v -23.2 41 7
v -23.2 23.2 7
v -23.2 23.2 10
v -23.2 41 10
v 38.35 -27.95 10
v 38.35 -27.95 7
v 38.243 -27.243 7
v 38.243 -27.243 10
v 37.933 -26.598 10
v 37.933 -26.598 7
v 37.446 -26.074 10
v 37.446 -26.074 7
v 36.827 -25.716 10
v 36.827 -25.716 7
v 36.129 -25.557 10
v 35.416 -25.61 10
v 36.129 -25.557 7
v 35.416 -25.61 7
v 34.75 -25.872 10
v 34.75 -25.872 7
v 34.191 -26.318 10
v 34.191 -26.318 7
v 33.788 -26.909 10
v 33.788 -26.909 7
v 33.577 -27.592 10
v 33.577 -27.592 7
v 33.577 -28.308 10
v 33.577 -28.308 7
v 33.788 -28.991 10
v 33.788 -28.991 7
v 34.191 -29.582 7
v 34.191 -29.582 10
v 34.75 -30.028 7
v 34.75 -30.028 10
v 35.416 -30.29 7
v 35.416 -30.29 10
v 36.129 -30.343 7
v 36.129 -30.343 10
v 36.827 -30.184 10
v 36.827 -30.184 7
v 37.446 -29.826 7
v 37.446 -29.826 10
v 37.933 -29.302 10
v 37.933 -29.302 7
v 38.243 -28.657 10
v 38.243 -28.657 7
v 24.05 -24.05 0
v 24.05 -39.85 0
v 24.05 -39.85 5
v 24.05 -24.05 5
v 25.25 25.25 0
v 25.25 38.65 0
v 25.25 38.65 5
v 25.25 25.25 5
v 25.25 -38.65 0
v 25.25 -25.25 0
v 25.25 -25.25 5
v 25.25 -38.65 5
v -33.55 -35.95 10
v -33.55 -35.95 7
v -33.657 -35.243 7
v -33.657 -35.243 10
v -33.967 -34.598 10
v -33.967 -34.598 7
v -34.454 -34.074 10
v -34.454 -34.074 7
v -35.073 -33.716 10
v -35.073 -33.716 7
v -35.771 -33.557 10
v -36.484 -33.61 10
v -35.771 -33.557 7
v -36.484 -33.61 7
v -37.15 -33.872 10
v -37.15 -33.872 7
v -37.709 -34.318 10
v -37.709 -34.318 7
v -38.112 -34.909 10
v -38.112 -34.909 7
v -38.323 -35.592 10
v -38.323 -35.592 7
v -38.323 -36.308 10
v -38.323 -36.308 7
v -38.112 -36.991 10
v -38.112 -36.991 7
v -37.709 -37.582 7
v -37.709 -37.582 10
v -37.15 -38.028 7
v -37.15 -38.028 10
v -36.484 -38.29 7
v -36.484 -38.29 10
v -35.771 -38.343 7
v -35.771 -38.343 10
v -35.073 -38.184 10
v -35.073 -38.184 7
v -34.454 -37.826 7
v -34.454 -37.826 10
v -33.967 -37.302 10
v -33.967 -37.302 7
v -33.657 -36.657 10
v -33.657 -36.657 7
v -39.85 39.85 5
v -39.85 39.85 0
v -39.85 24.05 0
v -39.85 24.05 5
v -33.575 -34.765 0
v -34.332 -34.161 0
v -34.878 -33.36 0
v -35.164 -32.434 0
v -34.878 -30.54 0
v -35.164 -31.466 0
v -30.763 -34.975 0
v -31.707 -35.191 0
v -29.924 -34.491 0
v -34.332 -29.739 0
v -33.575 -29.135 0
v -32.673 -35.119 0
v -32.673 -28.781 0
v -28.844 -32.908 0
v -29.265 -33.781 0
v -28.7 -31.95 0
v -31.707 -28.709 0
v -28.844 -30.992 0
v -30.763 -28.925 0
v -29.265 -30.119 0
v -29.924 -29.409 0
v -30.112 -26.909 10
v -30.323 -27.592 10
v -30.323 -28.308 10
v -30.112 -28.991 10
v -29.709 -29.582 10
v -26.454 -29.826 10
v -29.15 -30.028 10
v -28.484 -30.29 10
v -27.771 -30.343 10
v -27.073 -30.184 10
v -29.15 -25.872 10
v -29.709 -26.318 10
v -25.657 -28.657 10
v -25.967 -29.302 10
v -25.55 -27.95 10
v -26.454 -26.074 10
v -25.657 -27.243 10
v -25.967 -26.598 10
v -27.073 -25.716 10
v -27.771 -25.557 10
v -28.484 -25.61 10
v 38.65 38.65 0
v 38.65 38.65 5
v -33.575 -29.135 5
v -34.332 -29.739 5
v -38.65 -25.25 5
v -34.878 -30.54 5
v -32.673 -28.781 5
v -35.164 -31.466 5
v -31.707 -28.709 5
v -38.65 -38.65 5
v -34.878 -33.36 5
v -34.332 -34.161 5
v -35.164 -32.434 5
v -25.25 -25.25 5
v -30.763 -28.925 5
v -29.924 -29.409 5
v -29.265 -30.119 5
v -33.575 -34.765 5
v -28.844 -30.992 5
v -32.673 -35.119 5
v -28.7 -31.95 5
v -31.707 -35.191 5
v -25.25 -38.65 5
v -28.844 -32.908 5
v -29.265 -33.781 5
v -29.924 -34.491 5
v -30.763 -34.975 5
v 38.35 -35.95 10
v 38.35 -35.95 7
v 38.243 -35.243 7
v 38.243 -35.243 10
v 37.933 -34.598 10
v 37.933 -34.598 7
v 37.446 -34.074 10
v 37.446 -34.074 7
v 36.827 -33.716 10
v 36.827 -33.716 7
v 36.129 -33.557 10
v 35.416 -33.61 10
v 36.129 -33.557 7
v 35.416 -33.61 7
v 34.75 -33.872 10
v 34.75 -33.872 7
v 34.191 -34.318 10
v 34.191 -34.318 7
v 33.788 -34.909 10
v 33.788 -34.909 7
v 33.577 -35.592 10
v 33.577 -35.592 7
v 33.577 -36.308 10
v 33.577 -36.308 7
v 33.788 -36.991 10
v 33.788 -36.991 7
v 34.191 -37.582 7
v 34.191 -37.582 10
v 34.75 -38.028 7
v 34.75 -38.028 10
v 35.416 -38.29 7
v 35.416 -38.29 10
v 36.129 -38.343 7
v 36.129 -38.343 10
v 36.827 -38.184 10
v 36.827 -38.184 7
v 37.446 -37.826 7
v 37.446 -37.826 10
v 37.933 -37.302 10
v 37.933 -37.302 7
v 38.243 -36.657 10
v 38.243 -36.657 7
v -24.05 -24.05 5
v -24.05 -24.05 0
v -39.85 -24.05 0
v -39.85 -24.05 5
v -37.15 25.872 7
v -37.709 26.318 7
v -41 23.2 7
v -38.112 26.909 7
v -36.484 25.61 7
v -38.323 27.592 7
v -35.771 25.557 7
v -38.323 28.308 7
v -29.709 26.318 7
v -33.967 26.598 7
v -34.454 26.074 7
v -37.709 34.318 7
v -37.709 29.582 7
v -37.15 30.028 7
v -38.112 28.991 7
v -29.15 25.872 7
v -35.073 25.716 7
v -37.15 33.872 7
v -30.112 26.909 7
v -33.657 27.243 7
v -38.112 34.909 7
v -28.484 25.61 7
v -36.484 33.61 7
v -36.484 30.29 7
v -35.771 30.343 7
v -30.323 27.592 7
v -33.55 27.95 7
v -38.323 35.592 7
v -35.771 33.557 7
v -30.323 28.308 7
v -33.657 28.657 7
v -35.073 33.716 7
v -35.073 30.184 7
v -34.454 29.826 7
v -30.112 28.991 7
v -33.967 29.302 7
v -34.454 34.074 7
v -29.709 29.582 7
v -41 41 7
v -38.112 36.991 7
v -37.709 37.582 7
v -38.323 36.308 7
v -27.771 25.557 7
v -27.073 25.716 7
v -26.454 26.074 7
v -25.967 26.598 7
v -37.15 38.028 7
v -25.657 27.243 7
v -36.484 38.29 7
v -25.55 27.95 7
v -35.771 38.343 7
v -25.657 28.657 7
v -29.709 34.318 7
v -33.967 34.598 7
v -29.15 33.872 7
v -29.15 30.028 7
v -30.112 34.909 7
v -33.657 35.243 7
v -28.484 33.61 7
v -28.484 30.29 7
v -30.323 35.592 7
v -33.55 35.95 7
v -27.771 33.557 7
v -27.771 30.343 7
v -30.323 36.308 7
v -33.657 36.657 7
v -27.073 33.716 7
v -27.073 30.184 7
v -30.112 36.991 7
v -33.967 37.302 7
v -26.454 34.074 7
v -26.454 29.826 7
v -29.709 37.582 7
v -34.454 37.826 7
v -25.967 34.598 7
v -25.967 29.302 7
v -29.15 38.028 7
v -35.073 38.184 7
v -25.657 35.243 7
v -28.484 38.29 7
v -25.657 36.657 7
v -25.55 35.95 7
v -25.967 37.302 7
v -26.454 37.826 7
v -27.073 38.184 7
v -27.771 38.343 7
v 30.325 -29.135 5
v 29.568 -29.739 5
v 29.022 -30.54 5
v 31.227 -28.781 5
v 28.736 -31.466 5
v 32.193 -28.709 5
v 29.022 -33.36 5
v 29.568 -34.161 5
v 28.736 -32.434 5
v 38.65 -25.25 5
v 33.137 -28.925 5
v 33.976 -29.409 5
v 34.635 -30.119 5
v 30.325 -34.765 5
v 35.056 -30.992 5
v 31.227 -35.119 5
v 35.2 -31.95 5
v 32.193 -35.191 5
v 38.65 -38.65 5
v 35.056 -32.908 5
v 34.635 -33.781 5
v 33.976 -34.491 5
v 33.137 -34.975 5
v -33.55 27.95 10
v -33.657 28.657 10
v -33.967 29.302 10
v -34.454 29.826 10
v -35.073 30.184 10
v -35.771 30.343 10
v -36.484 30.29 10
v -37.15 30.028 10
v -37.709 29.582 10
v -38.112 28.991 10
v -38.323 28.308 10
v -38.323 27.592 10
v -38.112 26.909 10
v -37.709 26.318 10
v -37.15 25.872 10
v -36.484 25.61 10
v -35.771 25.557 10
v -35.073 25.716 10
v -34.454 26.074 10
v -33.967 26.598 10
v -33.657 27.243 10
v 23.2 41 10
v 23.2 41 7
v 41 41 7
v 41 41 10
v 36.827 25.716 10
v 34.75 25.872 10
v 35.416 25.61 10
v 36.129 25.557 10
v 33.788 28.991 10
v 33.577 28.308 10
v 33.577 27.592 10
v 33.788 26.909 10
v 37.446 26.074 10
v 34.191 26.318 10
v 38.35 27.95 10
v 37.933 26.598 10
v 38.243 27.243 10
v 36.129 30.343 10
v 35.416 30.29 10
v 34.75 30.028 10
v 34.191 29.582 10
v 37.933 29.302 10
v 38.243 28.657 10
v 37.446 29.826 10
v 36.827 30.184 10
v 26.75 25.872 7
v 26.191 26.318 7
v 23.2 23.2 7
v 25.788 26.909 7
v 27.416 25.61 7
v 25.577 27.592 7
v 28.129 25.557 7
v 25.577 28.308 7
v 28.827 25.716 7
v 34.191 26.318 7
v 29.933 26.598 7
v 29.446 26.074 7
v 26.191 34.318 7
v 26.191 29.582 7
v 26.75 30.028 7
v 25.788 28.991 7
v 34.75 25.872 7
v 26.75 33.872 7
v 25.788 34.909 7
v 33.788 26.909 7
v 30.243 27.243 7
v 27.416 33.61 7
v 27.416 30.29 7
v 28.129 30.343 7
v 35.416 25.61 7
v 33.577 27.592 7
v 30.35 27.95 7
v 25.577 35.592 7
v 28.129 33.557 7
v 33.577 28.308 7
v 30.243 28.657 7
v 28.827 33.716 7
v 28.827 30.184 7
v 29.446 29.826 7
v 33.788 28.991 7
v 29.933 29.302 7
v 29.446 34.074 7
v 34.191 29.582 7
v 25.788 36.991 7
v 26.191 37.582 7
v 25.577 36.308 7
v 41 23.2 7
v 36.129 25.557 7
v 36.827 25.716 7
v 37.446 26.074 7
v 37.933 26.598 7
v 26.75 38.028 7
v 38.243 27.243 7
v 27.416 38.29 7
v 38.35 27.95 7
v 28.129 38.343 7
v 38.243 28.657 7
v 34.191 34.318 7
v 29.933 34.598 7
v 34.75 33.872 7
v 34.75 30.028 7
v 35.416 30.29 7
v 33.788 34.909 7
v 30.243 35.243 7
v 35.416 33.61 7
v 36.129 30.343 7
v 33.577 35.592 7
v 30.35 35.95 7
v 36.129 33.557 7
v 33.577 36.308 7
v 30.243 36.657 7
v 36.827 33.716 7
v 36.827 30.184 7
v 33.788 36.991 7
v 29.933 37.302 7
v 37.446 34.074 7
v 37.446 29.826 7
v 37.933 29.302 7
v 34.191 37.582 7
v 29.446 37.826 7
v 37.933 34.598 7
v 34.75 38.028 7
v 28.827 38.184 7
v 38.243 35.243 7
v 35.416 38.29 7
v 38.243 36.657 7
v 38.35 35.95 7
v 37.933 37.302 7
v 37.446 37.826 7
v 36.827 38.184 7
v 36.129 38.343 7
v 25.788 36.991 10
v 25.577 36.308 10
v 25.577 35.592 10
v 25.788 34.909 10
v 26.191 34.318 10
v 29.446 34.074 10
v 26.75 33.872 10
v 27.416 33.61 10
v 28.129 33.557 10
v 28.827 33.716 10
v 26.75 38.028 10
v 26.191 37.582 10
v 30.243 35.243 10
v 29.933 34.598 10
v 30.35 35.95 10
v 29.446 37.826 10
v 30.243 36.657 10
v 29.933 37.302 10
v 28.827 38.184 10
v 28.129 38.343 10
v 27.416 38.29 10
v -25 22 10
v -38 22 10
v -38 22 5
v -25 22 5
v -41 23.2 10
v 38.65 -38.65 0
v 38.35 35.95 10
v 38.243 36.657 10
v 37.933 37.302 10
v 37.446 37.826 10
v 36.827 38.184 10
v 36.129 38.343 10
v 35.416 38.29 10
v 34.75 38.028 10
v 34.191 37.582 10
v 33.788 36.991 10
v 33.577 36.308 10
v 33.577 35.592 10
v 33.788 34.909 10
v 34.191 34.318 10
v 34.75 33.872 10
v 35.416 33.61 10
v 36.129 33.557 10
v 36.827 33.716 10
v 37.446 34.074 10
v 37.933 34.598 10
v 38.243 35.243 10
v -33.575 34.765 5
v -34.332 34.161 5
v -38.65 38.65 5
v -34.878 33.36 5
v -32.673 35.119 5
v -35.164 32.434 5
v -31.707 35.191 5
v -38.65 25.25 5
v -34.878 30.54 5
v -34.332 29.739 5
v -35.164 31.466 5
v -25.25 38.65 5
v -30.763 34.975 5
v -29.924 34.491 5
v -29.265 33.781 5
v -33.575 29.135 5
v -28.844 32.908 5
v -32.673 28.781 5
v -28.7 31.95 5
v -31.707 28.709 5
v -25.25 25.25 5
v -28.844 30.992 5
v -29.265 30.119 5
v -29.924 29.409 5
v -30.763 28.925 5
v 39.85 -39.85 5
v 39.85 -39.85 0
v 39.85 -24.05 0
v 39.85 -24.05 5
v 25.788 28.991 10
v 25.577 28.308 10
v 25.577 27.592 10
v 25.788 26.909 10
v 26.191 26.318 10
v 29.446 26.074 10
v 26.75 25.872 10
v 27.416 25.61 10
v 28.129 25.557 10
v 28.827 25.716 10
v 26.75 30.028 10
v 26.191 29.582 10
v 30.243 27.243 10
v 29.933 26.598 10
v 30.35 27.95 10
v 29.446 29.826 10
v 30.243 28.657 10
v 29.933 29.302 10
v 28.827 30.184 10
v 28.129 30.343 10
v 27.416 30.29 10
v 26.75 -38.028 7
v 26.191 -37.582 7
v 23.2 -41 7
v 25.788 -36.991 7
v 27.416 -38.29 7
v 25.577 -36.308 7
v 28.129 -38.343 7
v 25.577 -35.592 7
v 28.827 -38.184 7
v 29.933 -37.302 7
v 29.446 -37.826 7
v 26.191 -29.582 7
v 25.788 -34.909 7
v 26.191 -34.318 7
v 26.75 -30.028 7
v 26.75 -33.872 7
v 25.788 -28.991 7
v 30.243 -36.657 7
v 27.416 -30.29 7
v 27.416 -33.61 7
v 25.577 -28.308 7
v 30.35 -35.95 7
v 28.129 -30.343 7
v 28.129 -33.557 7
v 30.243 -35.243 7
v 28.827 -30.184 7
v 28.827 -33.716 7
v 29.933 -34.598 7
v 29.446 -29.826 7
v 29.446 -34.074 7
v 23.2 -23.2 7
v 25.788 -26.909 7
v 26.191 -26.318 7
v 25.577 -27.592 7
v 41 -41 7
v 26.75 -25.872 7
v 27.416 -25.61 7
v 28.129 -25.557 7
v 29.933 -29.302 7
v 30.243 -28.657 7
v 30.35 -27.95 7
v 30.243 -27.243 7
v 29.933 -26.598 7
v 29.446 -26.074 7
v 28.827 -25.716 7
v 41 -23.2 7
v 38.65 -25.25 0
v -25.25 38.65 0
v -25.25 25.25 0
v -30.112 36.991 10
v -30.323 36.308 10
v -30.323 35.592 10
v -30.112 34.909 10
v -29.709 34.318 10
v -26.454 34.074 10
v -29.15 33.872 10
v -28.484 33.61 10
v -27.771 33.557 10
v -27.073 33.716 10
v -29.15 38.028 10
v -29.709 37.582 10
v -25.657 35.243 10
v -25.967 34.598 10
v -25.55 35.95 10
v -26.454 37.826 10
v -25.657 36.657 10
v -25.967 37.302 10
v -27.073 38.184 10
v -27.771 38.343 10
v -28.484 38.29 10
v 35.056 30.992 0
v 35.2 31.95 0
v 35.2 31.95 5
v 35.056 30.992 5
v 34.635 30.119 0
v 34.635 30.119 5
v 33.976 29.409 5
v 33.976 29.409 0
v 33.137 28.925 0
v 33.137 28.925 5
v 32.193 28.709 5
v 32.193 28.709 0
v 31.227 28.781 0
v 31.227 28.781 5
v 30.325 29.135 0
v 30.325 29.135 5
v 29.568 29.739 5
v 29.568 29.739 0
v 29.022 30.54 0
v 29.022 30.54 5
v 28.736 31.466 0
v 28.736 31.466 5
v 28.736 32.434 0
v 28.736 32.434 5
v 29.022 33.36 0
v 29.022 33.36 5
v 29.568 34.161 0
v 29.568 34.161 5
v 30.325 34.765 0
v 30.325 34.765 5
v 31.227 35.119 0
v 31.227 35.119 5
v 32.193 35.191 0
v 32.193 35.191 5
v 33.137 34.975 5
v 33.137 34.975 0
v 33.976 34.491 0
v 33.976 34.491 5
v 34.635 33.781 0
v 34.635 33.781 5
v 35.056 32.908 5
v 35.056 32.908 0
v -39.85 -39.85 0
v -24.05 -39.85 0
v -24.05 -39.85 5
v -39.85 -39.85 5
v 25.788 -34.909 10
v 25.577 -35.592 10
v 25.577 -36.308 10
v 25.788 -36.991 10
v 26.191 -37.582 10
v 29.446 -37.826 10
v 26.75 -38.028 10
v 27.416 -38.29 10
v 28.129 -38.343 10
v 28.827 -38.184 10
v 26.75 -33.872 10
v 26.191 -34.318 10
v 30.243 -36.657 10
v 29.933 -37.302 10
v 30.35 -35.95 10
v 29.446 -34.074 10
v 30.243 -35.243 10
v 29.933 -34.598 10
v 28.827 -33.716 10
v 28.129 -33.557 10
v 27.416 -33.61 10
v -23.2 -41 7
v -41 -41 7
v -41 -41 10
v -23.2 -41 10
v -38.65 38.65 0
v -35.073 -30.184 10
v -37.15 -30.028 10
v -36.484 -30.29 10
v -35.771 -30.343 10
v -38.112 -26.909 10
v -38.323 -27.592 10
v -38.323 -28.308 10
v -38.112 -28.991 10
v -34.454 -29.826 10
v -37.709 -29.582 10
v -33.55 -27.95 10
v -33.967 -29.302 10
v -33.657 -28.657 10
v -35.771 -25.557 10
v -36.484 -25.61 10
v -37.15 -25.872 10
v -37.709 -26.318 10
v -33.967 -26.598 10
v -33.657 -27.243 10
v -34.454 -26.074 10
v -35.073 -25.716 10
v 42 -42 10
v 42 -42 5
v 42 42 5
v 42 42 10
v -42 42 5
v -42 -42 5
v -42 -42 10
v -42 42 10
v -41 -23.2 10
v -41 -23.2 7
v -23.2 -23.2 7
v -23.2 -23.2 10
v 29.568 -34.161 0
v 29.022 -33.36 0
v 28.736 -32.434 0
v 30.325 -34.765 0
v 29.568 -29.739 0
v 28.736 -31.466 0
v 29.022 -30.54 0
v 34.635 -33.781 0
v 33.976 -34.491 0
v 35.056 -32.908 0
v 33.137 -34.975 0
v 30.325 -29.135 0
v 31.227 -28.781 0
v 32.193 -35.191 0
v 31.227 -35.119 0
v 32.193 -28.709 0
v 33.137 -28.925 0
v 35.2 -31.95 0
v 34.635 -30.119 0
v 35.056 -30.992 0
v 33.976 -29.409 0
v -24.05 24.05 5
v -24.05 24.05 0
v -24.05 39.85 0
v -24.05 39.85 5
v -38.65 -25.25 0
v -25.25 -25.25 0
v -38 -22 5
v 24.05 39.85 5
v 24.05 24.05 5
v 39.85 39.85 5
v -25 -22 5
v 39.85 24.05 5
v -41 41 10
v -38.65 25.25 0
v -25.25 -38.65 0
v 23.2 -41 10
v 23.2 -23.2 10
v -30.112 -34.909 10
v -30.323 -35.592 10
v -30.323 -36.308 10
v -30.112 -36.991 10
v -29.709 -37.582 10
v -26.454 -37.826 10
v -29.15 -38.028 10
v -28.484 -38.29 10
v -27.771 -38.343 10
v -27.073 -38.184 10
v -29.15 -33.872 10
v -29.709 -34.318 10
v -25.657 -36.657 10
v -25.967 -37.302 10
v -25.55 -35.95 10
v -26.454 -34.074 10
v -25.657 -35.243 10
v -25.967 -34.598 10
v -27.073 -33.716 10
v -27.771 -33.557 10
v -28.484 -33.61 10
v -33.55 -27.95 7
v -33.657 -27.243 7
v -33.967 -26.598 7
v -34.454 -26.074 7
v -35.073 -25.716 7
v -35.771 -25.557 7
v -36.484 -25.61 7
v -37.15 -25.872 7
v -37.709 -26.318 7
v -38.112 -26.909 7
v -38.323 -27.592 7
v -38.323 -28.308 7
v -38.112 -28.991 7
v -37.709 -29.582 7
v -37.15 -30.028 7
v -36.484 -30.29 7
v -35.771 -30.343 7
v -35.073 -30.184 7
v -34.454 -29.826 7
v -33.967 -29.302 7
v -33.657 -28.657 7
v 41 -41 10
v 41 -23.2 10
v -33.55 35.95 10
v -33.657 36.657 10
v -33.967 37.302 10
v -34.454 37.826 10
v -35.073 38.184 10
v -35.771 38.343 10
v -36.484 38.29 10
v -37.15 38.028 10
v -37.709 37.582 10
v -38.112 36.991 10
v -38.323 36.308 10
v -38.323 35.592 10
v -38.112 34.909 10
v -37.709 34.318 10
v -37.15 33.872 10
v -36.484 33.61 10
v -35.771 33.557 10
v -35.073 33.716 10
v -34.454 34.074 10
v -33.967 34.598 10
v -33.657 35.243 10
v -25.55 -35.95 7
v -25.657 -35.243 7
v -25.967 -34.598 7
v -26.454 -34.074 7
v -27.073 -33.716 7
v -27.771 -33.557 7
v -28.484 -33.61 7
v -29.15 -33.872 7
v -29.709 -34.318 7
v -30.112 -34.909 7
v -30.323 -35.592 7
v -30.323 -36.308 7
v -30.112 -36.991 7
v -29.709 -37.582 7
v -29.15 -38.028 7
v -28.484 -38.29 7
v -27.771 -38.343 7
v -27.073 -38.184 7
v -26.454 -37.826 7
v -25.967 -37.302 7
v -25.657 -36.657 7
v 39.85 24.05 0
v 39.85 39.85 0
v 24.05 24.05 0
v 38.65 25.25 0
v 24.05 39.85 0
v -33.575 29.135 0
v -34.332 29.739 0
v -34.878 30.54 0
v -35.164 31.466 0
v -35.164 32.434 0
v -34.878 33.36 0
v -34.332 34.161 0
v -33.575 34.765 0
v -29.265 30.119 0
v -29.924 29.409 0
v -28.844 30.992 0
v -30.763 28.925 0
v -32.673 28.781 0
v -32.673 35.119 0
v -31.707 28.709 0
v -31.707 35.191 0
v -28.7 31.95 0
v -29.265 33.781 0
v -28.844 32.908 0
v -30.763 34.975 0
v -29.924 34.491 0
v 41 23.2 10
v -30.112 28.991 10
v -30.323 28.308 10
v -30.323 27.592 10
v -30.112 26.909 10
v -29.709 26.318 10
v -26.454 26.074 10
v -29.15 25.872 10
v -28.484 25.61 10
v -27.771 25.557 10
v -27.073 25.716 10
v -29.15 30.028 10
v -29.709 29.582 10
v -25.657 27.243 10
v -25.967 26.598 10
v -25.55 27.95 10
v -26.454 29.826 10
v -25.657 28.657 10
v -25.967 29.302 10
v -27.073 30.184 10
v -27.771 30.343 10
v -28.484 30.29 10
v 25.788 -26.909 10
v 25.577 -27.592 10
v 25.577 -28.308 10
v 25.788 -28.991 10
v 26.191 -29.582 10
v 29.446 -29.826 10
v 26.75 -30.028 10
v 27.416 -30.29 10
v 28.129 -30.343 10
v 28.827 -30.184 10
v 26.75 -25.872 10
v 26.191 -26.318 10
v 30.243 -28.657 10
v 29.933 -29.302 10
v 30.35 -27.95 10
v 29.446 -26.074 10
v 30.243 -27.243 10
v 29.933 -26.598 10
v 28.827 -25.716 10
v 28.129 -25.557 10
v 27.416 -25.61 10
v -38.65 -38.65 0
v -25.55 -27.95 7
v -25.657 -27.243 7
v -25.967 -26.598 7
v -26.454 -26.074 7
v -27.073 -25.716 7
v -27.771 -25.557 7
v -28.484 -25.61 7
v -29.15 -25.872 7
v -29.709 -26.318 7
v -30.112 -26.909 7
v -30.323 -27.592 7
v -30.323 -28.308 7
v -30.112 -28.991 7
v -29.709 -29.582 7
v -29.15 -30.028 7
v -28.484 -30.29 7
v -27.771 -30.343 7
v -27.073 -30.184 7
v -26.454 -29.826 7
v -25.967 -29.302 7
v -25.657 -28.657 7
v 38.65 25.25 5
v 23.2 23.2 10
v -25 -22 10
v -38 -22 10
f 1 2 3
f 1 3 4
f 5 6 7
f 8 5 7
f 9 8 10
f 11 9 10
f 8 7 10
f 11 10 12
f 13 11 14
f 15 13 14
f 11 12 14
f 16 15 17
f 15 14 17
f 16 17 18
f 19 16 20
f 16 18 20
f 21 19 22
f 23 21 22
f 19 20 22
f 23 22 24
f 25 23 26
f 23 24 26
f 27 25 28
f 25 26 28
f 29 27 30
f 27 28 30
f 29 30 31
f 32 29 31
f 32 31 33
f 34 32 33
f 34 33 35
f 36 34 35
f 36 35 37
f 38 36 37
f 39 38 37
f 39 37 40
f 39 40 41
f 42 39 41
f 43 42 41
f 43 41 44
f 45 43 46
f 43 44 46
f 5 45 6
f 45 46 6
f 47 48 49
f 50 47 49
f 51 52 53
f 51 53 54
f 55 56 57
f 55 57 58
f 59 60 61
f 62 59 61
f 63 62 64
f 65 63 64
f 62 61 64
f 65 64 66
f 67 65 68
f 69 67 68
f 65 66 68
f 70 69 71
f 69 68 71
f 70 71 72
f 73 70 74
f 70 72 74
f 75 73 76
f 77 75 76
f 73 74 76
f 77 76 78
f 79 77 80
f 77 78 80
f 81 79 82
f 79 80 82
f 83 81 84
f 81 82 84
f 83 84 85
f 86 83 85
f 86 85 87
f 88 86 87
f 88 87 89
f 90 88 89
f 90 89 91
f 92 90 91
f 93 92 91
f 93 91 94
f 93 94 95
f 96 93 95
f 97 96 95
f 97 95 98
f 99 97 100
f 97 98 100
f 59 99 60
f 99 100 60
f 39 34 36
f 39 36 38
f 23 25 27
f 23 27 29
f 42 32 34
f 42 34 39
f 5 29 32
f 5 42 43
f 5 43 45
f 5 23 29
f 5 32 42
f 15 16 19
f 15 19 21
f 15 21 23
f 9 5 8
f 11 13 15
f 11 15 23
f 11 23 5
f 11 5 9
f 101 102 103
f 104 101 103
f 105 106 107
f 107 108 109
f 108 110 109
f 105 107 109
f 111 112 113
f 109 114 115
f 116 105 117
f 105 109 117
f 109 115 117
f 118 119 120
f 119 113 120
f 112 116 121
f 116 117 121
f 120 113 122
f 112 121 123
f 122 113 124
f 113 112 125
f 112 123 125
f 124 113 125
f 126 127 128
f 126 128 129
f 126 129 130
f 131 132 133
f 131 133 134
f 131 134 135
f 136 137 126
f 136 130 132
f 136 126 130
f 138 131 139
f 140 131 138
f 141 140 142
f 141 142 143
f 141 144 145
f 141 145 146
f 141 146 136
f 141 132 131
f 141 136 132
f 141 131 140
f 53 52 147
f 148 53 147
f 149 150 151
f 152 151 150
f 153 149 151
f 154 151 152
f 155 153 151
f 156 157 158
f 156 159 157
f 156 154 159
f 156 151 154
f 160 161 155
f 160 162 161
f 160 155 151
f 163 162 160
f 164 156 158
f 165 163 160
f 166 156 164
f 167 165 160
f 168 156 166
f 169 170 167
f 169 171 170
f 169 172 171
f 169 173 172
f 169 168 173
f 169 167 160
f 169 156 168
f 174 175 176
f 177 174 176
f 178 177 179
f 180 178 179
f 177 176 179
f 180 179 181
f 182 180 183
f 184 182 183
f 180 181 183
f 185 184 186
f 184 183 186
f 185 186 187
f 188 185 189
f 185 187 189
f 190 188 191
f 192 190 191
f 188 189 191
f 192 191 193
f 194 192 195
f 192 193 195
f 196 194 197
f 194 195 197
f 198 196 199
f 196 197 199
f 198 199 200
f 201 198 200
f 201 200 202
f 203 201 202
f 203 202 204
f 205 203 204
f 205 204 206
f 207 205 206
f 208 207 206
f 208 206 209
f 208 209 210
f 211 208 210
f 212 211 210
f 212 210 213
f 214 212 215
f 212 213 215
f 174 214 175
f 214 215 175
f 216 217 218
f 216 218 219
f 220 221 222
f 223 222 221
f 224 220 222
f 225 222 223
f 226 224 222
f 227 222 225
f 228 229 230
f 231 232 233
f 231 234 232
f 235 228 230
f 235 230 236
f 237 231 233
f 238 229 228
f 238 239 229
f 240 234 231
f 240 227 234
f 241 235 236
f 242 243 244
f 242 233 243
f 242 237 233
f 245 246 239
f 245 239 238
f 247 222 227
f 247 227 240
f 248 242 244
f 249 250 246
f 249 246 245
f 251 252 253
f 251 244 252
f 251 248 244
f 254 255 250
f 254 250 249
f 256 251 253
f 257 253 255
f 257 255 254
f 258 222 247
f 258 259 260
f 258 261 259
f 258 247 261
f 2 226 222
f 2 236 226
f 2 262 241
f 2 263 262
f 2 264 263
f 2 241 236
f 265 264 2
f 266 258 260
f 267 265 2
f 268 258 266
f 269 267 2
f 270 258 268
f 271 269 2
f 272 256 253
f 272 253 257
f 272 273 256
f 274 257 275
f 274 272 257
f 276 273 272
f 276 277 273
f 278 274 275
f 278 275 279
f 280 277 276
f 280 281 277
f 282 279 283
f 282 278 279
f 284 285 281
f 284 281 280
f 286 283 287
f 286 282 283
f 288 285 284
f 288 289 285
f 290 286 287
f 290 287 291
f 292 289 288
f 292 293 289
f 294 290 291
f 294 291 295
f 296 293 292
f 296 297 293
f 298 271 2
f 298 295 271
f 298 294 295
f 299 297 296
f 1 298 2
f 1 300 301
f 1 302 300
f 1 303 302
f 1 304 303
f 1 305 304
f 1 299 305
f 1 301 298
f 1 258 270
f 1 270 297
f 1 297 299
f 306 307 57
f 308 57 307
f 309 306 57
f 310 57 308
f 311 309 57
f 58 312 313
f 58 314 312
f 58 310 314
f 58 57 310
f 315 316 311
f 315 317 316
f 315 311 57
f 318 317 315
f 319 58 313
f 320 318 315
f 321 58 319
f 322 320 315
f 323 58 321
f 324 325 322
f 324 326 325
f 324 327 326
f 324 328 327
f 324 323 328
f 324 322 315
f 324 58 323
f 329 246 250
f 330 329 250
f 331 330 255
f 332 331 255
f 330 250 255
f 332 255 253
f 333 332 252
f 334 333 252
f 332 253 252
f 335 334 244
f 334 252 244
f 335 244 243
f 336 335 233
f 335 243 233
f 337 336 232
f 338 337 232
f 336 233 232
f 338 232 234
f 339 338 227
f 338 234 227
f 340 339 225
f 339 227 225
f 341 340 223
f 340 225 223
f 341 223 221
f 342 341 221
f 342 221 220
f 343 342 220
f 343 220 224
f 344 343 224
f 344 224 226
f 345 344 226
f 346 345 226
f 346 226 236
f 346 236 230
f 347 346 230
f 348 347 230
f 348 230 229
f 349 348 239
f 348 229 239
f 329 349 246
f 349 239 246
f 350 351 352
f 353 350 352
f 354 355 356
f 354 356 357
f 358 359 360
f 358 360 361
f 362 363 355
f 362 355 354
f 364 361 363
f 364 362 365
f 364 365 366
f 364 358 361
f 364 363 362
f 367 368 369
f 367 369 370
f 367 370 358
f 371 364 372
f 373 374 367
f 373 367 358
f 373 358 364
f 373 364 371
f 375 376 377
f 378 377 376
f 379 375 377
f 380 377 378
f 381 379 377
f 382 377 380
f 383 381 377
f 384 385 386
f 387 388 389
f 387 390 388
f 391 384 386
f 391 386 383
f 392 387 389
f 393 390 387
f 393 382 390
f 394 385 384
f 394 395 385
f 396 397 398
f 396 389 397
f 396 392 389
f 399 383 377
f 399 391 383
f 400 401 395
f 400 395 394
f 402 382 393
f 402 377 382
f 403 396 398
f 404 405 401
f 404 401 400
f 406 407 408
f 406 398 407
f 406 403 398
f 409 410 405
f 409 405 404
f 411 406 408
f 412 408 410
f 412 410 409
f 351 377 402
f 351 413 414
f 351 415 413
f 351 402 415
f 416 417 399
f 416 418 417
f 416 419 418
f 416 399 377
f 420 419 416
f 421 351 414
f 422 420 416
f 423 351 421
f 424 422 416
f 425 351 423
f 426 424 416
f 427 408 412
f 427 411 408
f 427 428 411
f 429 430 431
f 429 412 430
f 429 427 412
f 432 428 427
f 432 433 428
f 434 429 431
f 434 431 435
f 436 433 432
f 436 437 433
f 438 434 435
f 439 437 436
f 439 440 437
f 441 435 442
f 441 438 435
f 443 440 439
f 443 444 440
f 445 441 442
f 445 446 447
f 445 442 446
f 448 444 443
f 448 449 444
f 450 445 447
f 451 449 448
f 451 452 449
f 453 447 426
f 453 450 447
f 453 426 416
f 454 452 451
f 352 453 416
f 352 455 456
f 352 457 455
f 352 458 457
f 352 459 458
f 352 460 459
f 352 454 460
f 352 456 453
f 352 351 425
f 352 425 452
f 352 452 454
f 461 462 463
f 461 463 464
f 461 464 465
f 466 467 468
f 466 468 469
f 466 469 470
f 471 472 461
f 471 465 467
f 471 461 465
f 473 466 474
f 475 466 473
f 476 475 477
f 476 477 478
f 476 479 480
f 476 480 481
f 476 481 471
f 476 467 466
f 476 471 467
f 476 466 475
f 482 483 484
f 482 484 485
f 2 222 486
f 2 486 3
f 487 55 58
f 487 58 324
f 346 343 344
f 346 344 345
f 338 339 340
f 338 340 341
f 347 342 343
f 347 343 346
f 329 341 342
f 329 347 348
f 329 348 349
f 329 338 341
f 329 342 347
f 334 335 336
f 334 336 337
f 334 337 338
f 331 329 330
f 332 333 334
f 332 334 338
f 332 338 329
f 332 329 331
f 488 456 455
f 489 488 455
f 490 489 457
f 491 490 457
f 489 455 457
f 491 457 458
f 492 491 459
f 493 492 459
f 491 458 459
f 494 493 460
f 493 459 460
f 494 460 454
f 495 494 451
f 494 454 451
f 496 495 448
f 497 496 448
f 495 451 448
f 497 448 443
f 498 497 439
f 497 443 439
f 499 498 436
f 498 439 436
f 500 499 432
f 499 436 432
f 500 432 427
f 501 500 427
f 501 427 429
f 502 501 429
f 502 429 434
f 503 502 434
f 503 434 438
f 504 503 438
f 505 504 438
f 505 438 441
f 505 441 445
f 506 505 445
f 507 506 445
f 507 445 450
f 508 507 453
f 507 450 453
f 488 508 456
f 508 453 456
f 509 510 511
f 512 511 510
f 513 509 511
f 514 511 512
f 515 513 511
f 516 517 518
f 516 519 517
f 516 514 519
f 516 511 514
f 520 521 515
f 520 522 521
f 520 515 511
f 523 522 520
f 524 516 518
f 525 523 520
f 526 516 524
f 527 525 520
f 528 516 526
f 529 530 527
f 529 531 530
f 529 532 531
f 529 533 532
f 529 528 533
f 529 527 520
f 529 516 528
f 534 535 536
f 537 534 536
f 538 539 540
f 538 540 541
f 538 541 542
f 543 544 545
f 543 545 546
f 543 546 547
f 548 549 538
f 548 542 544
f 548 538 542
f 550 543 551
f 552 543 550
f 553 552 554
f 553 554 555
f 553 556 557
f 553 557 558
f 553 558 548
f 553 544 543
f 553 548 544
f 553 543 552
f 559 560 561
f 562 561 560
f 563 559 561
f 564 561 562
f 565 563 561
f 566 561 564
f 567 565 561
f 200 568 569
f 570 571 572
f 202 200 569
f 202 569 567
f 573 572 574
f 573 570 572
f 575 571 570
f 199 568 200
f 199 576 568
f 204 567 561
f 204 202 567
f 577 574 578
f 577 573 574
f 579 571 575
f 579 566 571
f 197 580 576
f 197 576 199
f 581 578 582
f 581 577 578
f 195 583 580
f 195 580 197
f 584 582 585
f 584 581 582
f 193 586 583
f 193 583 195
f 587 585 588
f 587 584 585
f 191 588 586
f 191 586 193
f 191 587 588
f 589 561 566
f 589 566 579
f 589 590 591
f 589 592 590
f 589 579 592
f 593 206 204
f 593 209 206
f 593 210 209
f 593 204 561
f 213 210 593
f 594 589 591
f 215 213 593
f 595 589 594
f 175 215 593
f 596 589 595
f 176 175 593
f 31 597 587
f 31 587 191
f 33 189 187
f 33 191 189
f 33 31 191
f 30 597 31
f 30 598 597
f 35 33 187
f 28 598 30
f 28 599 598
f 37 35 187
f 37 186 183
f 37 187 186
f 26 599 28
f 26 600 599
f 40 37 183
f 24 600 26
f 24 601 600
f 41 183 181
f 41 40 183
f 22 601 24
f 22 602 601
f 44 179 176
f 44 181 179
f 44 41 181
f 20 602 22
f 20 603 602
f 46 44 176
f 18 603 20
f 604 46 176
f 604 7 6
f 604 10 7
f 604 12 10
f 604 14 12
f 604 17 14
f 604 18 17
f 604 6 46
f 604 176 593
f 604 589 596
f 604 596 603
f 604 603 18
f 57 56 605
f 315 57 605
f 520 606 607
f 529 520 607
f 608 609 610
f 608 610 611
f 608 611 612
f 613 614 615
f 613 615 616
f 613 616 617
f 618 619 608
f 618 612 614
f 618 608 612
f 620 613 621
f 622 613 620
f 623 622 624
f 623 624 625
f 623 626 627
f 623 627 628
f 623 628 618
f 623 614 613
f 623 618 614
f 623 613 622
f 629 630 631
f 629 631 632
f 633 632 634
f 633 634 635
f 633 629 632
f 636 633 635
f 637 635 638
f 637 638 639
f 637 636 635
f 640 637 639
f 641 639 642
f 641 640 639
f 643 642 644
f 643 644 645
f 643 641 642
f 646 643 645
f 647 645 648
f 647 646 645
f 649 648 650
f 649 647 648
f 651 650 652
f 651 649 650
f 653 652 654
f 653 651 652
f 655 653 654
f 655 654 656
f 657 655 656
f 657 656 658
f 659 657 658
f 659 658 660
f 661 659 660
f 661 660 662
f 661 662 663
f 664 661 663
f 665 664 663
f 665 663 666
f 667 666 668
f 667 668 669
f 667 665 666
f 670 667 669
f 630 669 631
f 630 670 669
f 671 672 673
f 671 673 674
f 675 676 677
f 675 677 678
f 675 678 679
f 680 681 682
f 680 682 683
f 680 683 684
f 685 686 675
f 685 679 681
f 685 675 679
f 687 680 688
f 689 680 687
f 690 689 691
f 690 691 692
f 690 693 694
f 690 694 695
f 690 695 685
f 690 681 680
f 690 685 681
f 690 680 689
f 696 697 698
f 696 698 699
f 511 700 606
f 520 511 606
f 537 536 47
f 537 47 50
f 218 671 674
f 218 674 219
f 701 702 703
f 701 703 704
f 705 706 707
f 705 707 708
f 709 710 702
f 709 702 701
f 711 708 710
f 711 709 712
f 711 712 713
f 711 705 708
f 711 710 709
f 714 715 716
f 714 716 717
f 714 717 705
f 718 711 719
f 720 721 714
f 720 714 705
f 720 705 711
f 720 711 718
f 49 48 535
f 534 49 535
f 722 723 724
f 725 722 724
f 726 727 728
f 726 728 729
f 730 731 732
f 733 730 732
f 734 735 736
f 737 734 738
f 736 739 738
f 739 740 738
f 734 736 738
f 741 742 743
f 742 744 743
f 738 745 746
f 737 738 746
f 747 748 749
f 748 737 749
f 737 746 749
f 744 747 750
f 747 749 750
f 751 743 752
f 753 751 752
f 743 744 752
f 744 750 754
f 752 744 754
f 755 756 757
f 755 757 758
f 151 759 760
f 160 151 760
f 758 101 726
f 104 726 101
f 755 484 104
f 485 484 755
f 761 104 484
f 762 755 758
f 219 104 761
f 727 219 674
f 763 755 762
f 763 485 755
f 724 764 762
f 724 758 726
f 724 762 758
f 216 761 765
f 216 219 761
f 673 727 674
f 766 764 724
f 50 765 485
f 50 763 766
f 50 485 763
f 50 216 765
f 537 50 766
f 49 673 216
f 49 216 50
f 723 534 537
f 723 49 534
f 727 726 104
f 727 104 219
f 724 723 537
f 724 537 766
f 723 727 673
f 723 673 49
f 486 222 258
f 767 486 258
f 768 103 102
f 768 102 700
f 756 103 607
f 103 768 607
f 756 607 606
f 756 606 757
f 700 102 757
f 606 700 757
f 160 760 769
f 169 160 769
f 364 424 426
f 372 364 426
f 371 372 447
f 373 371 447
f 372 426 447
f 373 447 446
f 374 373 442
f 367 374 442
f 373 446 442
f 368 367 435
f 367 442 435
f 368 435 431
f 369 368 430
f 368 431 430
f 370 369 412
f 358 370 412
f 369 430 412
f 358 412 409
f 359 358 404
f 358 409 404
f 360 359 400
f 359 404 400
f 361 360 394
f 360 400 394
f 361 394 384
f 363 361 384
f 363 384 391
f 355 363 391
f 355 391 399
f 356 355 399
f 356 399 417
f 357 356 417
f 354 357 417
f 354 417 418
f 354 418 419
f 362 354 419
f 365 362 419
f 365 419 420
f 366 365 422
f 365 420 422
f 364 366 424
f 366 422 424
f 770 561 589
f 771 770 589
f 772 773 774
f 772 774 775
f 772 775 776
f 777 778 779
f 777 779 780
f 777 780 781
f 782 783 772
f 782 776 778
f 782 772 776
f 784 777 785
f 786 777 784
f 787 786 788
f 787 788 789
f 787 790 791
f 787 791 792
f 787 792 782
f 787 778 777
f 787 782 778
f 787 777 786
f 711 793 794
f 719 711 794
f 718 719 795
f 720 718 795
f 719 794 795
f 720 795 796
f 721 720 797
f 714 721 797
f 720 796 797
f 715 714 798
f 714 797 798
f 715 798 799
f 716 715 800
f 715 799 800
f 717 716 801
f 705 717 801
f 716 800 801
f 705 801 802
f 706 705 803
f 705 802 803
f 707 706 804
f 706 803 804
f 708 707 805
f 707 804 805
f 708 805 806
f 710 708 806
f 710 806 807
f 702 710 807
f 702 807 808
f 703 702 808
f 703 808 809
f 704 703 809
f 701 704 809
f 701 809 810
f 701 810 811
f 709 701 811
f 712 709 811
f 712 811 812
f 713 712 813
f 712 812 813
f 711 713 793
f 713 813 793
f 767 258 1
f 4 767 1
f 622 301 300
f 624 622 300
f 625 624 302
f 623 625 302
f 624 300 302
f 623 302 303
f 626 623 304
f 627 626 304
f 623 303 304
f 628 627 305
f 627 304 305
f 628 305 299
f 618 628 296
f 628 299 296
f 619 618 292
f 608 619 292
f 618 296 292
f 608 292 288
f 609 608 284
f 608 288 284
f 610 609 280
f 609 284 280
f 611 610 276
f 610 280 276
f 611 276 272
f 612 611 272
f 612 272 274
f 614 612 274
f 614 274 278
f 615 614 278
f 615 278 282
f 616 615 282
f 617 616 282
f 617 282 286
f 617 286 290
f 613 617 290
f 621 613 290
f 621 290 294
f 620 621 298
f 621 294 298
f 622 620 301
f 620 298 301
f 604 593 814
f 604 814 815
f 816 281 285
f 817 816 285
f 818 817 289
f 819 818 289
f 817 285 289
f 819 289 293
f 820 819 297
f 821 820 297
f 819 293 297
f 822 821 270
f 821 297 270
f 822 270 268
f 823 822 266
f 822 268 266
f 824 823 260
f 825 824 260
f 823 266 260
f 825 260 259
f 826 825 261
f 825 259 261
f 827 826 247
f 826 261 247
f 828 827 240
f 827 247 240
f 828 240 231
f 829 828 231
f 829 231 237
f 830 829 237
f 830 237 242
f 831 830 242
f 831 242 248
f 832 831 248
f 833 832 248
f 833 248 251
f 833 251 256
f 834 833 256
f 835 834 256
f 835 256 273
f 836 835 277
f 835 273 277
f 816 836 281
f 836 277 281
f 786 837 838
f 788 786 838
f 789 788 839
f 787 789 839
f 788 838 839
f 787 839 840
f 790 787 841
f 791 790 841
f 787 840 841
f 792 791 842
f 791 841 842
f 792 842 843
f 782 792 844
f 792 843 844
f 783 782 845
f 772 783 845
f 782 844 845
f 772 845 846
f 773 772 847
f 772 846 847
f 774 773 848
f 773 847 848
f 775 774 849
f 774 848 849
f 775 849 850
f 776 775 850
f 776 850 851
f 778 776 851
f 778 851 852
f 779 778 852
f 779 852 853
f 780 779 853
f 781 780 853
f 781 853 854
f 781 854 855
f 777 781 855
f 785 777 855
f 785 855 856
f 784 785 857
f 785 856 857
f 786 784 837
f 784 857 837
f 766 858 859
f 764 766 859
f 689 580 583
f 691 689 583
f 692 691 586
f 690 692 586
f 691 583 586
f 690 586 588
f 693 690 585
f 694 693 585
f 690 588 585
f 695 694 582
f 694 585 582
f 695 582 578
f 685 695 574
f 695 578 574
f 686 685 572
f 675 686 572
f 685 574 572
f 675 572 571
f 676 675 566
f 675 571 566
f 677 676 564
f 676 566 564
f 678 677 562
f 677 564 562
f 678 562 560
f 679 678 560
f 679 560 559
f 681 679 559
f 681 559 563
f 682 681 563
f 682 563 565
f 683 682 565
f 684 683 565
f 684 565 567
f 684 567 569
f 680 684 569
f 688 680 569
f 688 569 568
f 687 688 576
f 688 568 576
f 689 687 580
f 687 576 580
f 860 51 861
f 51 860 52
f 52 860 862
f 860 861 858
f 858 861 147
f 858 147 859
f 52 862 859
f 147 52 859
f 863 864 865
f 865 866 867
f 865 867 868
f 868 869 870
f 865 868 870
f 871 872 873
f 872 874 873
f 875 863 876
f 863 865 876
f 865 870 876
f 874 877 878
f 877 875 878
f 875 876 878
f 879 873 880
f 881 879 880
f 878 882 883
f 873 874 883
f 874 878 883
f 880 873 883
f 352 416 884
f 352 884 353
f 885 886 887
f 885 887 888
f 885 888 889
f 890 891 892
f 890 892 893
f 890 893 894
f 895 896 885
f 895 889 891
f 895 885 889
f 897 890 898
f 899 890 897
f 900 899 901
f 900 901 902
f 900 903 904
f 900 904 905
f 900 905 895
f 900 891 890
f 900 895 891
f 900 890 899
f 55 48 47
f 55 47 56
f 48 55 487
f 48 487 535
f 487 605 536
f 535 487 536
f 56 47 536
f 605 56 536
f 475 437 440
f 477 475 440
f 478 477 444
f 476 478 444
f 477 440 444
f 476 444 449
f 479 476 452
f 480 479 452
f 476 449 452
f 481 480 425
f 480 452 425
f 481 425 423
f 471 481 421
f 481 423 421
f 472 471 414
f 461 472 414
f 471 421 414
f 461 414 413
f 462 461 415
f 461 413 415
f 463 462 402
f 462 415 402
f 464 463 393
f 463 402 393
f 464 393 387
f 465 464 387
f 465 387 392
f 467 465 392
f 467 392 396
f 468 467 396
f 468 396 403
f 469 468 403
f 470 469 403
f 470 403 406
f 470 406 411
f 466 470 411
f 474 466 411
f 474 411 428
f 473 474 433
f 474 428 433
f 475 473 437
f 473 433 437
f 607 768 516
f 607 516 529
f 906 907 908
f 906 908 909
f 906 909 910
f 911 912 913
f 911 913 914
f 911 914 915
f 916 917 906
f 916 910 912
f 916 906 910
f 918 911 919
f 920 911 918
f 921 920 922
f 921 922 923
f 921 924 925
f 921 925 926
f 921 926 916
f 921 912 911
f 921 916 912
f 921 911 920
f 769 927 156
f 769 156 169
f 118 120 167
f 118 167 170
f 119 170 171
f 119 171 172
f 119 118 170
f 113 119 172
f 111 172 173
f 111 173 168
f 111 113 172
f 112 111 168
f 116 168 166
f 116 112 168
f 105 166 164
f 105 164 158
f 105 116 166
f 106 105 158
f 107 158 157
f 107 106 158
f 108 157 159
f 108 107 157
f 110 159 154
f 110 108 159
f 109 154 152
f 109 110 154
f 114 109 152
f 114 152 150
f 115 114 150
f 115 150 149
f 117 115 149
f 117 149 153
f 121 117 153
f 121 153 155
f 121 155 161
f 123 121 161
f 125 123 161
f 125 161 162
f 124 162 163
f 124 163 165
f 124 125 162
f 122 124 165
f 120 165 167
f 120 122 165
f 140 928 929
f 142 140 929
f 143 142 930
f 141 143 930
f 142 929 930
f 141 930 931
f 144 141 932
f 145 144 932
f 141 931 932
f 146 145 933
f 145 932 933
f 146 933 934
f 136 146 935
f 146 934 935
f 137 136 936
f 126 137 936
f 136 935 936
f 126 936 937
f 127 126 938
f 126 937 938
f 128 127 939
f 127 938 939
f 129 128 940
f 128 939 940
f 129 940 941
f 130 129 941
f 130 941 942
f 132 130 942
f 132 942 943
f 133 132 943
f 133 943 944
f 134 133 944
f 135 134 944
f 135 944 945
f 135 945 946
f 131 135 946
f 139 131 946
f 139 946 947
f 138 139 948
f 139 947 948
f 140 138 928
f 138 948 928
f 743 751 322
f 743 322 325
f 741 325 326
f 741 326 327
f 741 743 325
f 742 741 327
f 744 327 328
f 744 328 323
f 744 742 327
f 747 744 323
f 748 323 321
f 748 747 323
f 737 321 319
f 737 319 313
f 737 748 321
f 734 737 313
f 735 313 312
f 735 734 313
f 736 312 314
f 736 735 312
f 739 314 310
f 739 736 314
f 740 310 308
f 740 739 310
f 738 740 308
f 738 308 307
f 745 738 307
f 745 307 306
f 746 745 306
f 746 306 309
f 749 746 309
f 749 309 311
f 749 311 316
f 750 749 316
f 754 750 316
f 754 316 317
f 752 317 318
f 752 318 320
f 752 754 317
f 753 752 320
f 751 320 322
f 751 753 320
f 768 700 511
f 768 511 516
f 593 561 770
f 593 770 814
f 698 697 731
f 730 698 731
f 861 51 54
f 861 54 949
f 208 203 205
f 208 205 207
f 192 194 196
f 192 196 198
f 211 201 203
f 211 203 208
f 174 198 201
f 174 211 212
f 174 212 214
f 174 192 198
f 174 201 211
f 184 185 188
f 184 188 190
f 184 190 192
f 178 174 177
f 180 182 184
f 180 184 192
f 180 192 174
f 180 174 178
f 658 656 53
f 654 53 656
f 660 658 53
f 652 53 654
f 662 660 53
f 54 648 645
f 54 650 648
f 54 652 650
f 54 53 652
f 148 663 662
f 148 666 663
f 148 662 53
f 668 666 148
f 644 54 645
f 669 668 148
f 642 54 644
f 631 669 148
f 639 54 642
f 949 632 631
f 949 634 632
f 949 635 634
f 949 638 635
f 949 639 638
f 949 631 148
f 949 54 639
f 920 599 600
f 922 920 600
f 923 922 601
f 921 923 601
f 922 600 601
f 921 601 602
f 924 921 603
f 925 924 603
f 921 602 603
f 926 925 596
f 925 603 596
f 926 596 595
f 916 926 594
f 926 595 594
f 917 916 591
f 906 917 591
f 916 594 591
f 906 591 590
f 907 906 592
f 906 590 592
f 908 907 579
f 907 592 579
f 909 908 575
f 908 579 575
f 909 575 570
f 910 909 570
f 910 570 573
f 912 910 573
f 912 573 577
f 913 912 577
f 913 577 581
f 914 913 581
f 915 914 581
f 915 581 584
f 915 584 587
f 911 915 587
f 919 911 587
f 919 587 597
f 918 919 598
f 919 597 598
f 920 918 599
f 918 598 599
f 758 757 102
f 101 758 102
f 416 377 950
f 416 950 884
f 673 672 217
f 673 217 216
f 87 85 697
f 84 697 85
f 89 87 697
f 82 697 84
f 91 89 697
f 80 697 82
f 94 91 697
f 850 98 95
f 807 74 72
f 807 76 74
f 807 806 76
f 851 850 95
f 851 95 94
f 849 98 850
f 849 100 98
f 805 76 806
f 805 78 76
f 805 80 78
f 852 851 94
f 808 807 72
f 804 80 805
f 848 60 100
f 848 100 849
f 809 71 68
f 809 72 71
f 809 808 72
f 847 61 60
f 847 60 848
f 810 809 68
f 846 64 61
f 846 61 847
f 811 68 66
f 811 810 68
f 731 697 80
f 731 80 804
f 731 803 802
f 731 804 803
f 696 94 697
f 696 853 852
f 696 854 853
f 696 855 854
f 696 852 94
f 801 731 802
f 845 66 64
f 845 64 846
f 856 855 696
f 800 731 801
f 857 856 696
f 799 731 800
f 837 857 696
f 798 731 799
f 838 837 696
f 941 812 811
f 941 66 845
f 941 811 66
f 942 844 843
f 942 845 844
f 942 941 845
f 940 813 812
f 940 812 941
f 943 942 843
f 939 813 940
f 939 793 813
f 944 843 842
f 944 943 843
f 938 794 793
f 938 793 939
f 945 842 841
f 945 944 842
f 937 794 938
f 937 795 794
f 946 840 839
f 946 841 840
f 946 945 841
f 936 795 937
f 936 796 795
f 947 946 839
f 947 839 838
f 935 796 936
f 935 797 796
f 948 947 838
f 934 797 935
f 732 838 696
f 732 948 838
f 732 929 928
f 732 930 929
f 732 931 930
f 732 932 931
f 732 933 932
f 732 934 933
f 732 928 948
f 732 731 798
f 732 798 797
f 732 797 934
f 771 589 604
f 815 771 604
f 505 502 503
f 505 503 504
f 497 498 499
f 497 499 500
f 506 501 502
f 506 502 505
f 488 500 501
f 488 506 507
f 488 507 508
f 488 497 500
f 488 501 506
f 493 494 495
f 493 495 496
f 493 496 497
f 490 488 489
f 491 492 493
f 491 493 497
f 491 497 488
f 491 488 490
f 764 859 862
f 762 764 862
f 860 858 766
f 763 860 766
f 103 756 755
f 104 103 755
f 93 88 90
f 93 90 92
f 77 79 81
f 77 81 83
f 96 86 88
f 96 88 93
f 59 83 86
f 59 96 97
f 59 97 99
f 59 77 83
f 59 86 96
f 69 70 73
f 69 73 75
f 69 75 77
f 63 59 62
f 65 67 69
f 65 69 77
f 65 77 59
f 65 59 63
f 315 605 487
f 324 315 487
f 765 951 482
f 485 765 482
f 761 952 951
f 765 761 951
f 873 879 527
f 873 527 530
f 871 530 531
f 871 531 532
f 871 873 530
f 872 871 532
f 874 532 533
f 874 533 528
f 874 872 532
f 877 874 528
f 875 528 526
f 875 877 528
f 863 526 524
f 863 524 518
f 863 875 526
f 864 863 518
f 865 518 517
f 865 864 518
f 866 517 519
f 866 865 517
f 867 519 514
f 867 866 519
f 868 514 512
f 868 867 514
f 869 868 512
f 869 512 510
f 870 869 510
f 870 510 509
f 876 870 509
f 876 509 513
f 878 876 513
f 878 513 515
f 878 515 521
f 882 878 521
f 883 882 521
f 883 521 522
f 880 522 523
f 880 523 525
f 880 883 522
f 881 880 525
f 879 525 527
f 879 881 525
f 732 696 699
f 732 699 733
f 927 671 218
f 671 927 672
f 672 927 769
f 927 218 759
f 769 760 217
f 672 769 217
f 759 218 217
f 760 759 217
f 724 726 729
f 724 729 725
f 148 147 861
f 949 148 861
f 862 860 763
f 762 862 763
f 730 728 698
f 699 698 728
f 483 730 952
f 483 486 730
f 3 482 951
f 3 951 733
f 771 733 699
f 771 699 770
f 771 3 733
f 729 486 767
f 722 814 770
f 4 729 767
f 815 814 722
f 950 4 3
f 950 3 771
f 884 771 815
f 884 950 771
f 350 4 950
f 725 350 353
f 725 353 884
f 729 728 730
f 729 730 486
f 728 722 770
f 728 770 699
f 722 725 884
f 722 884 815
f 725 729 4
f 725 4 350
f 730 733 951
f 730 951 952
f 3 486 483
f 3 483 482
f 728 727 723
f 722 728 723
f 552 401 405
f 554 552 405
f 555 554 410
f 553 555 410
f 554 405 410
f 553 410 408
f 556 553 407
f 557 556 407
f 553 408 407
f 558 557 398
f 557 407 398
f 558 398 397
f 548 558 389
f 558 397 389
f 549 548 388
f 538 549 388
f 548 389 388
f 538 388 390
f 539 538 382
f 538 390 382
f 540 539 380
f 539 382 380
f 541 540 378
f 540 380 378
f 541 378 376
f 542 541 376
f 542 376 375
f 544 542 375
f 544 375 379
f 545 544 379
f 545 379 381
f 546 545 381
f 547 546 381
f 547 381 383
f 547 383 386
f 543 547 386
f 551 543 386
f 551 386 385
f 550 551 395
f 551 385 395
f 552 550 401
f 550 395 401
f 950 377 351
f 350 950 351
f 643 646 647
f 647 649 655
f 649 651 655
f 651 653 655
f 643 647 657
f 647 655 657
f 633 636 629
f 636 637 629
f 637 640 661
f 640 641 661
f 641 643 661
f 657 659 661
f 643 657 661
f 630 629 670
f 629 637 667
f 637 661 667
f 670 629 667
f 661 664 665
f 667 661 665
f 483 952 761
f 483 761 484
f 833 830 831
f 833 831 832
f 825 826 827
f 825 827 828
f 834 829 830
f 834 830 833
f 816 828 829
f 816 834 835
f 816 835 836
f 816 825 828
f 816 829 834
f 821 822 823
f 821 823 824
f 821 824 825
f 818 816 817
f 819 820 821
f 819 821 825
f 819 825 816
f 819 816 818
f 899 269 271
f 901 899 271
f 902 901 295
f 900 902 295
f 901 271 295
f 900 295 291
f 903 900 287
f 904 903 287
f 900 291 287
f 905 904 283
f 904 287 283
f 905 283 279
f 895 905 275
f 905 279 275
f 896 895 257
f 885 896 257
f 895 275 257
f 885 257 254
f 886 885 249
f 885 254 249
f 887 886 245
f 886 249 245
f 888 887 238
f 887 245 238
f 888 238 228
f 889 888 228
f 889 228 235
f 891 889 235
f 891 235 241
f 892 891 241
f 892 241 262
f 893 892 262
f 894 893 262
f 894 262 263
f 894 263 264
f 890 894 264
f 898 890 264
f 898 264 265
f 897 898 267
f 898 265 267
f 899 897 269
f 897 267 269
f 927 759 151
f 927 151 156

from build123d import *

# Parameters (mm, degrees)
SKETCH_W        = 84
SKETCH_H        = 84
PAD_DEPTH       = 7
SKETCH006_W     = 13.4
SKETCH006_H     = 13.4
SKETCH006_R     = 3.25
POCKET_DEPTH    = 5
SKETCH004_R     = 2.4
PAD001_DEPTH    = 3
SKETCH011_W     = 84
SKETCH011_H     = 84
SKETCH011_W_2   = 17.8
SKETCH011_H_2   = 17.8
PAD002_DEPTH    = 3
SKETCH005_W     = 13
SKETCH005_H     = 44
POCKET001_DEPTH = 10.001
SKETCH012_W     = 48.1
SKETCH012_H     = 5
POCKET002_DEPTH = 84.001
SKETCH013_W     = 48.1
SKETCH013_H     = 5
POCKET003_DEPTH = 84.001


with BuildPart() as part:
    # Sketch → Pad (new body)
    with BuildSketch(Plane.XY):
        Rectangle(SKETCH_W, SKETCH_H)
    extrude(amount=PAD_DEPTH)

    # Sketch006 → Pocket (cut)
    with BuildSketch(Plane(origin=(0, 0, 0), x_dir=(1, 0, 0), z_dir=(0, 0, -1))):
        with Locations((-31.95, 31.95)):
            Rectangle(SKETCH006_W, SKETCH006_H)
        with Locations((-31.95, 31.95)):
            Circle(SKETCH006_R, mode=Mode.SUBTRACT)
        with Locations((31.95, 31.95)):
            Rectangle(SKETCH006_W, SKETCH006_H)
        with Locations((31.95, 31.95)):
            Circle(SKETCH006_R, mode=Mode.SUBTRACT)
        with Locations((-31.95, -31.95)):
            Rectangle(SKETCH006_W, SKETCH006_H)
        with Locations((-31.95, -31.95)):
            Circle(SKETCH006_R, mode=Mode.SUBTRACT)
        with Locations((31.95, -31.95)):
            Rectangle(SKETCH006_W, SKETCH006_H)
        with Locations((31.95, -31.95)):
            Circle(SKETCH006_R, mode=Mode.SUBTRACT)
        Polygon((-42, -24.05), (-42, -42), (-24.05, -42), (-24.05, -39.85), (-39.85, -39.85), (-39.85, -24.05), align=None)
        Polygon((24.05, -42), (42, -42), (42, -24.05), (39.85, -24.05), (39.85, -39.85), (24.05, -39.85), align=None)
        Polygon((42, 24.05), (42, 42), (24.05, 42), (24.05, 39.85), (39.85, 39.85), (39.85, 24.05), align=None)
        Polygon((-42, 24.05), (-42, 42), (-24.05, 42), (-24.05, 39.85), (-39.85, 39.85), (-39.85, 24.05), align=None)
    extrude(amount=-POCKET_DEPTH, mode=Mode.SUBTRACT)

    # Sketch004 → Pad001 (new body)
    with BuildSketch(Plane.XY.offset(7)):
        with Locations((-35.95, -35.95)):
            Circle(SKETCH004_R)
        with Locations((35.95, 35.95)):
            Circle(SKETCH004_R)
        with Locations((35.95, -35.95)):
            Circle(SKETCH004_R)
        with Locations((-35.95, 35.95)):
            Circle(SKETCH004_R)
        with Locations((-27.95, 35.95)):
            Circle(SKETCH004_R)
        with Locations((-27.95, 27.95)):
            Circle(SKETCH004_R)
        with Locations((27.95, 27.95)):
            Circle(SKETCH004_R)
        with Locations((27.95, 35.95)):
            Circle(SKETCH004_R)
        with Locations((-35.95, 27.95)):
            Circle(SKETCH004_R)
        with Locations((35.95, 27.95)):
            Circle(SKETCH004_R)
        with Locations((27.95, -27.95)):
            Circle(SKETCH004_R)
        with Locations((27.95, -35.95)):
            Circle(SKETCH004_R)
        with Locations((35.95, -27.95)):
            Circle(SKETCH004_R)
        with Locations((-27.95, -27.95)):
            Circle(SKETCH004_R)
        with Locations((-27.95, -35.95)):
            Circle(SKETCH004_R)
        with Locations((-35.95, -27.95)):
            Circle(SKETCH004_R)
    extrude(amount=PAD001_DEPTH)

    # Sketch011 → Pad002 (new body)
    with BuildSketch(Plane.XY.offset(7)):
        Rectangle(SKETCH011_W, SKETCH011_H)
        with Locations((-32.1, 32.1)):
            Rectangle(SKETCH011_W_2, SKETCH011_H_2, mode=Mode.SUBTRACT)
        with Locations((-32.1, -32.1)):
            Rectangle(SKETCH011_W_2, SKETCH011_H_2, mode=Mode.SUBTRACT)
        with Locations((32.1, 32.1)):
            Rectangle(SKETCH011_W_2, SKETCH011_H_2, mode=Mode.SUBTRACT)
        with Locations((32.1, -32.1)):
            Rectangle(SKETCH011_W_2, SKETCH011_H_2, mode=Mode.SUBTRACT)
    extrude(amount=PAD002_DEPTH)

    # Sketch005 → Pocket001 (cut, through all)
    with BuildSketch(Plane.XY.offset(10)):
        with Locations((-31.5, 0)):
            Rectangle(SKETCH005_W, SKETCH005_H)
    extrude(amount=-POCKET001_DEPTH, mode=Mode.SUBTRACT)

    # Sketch012 → Pocket002 (cut, through all)
    with BuildSketch(Plane.XZ.offset(42)):
        with Locations((0, 2.5)):
            Rectangle(SKETCH012_W, SKETCH012_H)
    extrude(amount=-POCKET002_DEPTH, mode=Mode.SUBTRACT)

    # Sketch013 → Pocket003 (cut, through all)
    with BuildSketch(Plane.YZ.offset(42)):
        with Locations((0, 2.5)):
            Rectangle(SKETCH013_W, SKETCH013_H)
    extrude(amount=-POCKET003_DEPTH, mode=Mode.SUBTRACT)


solid = part.part
